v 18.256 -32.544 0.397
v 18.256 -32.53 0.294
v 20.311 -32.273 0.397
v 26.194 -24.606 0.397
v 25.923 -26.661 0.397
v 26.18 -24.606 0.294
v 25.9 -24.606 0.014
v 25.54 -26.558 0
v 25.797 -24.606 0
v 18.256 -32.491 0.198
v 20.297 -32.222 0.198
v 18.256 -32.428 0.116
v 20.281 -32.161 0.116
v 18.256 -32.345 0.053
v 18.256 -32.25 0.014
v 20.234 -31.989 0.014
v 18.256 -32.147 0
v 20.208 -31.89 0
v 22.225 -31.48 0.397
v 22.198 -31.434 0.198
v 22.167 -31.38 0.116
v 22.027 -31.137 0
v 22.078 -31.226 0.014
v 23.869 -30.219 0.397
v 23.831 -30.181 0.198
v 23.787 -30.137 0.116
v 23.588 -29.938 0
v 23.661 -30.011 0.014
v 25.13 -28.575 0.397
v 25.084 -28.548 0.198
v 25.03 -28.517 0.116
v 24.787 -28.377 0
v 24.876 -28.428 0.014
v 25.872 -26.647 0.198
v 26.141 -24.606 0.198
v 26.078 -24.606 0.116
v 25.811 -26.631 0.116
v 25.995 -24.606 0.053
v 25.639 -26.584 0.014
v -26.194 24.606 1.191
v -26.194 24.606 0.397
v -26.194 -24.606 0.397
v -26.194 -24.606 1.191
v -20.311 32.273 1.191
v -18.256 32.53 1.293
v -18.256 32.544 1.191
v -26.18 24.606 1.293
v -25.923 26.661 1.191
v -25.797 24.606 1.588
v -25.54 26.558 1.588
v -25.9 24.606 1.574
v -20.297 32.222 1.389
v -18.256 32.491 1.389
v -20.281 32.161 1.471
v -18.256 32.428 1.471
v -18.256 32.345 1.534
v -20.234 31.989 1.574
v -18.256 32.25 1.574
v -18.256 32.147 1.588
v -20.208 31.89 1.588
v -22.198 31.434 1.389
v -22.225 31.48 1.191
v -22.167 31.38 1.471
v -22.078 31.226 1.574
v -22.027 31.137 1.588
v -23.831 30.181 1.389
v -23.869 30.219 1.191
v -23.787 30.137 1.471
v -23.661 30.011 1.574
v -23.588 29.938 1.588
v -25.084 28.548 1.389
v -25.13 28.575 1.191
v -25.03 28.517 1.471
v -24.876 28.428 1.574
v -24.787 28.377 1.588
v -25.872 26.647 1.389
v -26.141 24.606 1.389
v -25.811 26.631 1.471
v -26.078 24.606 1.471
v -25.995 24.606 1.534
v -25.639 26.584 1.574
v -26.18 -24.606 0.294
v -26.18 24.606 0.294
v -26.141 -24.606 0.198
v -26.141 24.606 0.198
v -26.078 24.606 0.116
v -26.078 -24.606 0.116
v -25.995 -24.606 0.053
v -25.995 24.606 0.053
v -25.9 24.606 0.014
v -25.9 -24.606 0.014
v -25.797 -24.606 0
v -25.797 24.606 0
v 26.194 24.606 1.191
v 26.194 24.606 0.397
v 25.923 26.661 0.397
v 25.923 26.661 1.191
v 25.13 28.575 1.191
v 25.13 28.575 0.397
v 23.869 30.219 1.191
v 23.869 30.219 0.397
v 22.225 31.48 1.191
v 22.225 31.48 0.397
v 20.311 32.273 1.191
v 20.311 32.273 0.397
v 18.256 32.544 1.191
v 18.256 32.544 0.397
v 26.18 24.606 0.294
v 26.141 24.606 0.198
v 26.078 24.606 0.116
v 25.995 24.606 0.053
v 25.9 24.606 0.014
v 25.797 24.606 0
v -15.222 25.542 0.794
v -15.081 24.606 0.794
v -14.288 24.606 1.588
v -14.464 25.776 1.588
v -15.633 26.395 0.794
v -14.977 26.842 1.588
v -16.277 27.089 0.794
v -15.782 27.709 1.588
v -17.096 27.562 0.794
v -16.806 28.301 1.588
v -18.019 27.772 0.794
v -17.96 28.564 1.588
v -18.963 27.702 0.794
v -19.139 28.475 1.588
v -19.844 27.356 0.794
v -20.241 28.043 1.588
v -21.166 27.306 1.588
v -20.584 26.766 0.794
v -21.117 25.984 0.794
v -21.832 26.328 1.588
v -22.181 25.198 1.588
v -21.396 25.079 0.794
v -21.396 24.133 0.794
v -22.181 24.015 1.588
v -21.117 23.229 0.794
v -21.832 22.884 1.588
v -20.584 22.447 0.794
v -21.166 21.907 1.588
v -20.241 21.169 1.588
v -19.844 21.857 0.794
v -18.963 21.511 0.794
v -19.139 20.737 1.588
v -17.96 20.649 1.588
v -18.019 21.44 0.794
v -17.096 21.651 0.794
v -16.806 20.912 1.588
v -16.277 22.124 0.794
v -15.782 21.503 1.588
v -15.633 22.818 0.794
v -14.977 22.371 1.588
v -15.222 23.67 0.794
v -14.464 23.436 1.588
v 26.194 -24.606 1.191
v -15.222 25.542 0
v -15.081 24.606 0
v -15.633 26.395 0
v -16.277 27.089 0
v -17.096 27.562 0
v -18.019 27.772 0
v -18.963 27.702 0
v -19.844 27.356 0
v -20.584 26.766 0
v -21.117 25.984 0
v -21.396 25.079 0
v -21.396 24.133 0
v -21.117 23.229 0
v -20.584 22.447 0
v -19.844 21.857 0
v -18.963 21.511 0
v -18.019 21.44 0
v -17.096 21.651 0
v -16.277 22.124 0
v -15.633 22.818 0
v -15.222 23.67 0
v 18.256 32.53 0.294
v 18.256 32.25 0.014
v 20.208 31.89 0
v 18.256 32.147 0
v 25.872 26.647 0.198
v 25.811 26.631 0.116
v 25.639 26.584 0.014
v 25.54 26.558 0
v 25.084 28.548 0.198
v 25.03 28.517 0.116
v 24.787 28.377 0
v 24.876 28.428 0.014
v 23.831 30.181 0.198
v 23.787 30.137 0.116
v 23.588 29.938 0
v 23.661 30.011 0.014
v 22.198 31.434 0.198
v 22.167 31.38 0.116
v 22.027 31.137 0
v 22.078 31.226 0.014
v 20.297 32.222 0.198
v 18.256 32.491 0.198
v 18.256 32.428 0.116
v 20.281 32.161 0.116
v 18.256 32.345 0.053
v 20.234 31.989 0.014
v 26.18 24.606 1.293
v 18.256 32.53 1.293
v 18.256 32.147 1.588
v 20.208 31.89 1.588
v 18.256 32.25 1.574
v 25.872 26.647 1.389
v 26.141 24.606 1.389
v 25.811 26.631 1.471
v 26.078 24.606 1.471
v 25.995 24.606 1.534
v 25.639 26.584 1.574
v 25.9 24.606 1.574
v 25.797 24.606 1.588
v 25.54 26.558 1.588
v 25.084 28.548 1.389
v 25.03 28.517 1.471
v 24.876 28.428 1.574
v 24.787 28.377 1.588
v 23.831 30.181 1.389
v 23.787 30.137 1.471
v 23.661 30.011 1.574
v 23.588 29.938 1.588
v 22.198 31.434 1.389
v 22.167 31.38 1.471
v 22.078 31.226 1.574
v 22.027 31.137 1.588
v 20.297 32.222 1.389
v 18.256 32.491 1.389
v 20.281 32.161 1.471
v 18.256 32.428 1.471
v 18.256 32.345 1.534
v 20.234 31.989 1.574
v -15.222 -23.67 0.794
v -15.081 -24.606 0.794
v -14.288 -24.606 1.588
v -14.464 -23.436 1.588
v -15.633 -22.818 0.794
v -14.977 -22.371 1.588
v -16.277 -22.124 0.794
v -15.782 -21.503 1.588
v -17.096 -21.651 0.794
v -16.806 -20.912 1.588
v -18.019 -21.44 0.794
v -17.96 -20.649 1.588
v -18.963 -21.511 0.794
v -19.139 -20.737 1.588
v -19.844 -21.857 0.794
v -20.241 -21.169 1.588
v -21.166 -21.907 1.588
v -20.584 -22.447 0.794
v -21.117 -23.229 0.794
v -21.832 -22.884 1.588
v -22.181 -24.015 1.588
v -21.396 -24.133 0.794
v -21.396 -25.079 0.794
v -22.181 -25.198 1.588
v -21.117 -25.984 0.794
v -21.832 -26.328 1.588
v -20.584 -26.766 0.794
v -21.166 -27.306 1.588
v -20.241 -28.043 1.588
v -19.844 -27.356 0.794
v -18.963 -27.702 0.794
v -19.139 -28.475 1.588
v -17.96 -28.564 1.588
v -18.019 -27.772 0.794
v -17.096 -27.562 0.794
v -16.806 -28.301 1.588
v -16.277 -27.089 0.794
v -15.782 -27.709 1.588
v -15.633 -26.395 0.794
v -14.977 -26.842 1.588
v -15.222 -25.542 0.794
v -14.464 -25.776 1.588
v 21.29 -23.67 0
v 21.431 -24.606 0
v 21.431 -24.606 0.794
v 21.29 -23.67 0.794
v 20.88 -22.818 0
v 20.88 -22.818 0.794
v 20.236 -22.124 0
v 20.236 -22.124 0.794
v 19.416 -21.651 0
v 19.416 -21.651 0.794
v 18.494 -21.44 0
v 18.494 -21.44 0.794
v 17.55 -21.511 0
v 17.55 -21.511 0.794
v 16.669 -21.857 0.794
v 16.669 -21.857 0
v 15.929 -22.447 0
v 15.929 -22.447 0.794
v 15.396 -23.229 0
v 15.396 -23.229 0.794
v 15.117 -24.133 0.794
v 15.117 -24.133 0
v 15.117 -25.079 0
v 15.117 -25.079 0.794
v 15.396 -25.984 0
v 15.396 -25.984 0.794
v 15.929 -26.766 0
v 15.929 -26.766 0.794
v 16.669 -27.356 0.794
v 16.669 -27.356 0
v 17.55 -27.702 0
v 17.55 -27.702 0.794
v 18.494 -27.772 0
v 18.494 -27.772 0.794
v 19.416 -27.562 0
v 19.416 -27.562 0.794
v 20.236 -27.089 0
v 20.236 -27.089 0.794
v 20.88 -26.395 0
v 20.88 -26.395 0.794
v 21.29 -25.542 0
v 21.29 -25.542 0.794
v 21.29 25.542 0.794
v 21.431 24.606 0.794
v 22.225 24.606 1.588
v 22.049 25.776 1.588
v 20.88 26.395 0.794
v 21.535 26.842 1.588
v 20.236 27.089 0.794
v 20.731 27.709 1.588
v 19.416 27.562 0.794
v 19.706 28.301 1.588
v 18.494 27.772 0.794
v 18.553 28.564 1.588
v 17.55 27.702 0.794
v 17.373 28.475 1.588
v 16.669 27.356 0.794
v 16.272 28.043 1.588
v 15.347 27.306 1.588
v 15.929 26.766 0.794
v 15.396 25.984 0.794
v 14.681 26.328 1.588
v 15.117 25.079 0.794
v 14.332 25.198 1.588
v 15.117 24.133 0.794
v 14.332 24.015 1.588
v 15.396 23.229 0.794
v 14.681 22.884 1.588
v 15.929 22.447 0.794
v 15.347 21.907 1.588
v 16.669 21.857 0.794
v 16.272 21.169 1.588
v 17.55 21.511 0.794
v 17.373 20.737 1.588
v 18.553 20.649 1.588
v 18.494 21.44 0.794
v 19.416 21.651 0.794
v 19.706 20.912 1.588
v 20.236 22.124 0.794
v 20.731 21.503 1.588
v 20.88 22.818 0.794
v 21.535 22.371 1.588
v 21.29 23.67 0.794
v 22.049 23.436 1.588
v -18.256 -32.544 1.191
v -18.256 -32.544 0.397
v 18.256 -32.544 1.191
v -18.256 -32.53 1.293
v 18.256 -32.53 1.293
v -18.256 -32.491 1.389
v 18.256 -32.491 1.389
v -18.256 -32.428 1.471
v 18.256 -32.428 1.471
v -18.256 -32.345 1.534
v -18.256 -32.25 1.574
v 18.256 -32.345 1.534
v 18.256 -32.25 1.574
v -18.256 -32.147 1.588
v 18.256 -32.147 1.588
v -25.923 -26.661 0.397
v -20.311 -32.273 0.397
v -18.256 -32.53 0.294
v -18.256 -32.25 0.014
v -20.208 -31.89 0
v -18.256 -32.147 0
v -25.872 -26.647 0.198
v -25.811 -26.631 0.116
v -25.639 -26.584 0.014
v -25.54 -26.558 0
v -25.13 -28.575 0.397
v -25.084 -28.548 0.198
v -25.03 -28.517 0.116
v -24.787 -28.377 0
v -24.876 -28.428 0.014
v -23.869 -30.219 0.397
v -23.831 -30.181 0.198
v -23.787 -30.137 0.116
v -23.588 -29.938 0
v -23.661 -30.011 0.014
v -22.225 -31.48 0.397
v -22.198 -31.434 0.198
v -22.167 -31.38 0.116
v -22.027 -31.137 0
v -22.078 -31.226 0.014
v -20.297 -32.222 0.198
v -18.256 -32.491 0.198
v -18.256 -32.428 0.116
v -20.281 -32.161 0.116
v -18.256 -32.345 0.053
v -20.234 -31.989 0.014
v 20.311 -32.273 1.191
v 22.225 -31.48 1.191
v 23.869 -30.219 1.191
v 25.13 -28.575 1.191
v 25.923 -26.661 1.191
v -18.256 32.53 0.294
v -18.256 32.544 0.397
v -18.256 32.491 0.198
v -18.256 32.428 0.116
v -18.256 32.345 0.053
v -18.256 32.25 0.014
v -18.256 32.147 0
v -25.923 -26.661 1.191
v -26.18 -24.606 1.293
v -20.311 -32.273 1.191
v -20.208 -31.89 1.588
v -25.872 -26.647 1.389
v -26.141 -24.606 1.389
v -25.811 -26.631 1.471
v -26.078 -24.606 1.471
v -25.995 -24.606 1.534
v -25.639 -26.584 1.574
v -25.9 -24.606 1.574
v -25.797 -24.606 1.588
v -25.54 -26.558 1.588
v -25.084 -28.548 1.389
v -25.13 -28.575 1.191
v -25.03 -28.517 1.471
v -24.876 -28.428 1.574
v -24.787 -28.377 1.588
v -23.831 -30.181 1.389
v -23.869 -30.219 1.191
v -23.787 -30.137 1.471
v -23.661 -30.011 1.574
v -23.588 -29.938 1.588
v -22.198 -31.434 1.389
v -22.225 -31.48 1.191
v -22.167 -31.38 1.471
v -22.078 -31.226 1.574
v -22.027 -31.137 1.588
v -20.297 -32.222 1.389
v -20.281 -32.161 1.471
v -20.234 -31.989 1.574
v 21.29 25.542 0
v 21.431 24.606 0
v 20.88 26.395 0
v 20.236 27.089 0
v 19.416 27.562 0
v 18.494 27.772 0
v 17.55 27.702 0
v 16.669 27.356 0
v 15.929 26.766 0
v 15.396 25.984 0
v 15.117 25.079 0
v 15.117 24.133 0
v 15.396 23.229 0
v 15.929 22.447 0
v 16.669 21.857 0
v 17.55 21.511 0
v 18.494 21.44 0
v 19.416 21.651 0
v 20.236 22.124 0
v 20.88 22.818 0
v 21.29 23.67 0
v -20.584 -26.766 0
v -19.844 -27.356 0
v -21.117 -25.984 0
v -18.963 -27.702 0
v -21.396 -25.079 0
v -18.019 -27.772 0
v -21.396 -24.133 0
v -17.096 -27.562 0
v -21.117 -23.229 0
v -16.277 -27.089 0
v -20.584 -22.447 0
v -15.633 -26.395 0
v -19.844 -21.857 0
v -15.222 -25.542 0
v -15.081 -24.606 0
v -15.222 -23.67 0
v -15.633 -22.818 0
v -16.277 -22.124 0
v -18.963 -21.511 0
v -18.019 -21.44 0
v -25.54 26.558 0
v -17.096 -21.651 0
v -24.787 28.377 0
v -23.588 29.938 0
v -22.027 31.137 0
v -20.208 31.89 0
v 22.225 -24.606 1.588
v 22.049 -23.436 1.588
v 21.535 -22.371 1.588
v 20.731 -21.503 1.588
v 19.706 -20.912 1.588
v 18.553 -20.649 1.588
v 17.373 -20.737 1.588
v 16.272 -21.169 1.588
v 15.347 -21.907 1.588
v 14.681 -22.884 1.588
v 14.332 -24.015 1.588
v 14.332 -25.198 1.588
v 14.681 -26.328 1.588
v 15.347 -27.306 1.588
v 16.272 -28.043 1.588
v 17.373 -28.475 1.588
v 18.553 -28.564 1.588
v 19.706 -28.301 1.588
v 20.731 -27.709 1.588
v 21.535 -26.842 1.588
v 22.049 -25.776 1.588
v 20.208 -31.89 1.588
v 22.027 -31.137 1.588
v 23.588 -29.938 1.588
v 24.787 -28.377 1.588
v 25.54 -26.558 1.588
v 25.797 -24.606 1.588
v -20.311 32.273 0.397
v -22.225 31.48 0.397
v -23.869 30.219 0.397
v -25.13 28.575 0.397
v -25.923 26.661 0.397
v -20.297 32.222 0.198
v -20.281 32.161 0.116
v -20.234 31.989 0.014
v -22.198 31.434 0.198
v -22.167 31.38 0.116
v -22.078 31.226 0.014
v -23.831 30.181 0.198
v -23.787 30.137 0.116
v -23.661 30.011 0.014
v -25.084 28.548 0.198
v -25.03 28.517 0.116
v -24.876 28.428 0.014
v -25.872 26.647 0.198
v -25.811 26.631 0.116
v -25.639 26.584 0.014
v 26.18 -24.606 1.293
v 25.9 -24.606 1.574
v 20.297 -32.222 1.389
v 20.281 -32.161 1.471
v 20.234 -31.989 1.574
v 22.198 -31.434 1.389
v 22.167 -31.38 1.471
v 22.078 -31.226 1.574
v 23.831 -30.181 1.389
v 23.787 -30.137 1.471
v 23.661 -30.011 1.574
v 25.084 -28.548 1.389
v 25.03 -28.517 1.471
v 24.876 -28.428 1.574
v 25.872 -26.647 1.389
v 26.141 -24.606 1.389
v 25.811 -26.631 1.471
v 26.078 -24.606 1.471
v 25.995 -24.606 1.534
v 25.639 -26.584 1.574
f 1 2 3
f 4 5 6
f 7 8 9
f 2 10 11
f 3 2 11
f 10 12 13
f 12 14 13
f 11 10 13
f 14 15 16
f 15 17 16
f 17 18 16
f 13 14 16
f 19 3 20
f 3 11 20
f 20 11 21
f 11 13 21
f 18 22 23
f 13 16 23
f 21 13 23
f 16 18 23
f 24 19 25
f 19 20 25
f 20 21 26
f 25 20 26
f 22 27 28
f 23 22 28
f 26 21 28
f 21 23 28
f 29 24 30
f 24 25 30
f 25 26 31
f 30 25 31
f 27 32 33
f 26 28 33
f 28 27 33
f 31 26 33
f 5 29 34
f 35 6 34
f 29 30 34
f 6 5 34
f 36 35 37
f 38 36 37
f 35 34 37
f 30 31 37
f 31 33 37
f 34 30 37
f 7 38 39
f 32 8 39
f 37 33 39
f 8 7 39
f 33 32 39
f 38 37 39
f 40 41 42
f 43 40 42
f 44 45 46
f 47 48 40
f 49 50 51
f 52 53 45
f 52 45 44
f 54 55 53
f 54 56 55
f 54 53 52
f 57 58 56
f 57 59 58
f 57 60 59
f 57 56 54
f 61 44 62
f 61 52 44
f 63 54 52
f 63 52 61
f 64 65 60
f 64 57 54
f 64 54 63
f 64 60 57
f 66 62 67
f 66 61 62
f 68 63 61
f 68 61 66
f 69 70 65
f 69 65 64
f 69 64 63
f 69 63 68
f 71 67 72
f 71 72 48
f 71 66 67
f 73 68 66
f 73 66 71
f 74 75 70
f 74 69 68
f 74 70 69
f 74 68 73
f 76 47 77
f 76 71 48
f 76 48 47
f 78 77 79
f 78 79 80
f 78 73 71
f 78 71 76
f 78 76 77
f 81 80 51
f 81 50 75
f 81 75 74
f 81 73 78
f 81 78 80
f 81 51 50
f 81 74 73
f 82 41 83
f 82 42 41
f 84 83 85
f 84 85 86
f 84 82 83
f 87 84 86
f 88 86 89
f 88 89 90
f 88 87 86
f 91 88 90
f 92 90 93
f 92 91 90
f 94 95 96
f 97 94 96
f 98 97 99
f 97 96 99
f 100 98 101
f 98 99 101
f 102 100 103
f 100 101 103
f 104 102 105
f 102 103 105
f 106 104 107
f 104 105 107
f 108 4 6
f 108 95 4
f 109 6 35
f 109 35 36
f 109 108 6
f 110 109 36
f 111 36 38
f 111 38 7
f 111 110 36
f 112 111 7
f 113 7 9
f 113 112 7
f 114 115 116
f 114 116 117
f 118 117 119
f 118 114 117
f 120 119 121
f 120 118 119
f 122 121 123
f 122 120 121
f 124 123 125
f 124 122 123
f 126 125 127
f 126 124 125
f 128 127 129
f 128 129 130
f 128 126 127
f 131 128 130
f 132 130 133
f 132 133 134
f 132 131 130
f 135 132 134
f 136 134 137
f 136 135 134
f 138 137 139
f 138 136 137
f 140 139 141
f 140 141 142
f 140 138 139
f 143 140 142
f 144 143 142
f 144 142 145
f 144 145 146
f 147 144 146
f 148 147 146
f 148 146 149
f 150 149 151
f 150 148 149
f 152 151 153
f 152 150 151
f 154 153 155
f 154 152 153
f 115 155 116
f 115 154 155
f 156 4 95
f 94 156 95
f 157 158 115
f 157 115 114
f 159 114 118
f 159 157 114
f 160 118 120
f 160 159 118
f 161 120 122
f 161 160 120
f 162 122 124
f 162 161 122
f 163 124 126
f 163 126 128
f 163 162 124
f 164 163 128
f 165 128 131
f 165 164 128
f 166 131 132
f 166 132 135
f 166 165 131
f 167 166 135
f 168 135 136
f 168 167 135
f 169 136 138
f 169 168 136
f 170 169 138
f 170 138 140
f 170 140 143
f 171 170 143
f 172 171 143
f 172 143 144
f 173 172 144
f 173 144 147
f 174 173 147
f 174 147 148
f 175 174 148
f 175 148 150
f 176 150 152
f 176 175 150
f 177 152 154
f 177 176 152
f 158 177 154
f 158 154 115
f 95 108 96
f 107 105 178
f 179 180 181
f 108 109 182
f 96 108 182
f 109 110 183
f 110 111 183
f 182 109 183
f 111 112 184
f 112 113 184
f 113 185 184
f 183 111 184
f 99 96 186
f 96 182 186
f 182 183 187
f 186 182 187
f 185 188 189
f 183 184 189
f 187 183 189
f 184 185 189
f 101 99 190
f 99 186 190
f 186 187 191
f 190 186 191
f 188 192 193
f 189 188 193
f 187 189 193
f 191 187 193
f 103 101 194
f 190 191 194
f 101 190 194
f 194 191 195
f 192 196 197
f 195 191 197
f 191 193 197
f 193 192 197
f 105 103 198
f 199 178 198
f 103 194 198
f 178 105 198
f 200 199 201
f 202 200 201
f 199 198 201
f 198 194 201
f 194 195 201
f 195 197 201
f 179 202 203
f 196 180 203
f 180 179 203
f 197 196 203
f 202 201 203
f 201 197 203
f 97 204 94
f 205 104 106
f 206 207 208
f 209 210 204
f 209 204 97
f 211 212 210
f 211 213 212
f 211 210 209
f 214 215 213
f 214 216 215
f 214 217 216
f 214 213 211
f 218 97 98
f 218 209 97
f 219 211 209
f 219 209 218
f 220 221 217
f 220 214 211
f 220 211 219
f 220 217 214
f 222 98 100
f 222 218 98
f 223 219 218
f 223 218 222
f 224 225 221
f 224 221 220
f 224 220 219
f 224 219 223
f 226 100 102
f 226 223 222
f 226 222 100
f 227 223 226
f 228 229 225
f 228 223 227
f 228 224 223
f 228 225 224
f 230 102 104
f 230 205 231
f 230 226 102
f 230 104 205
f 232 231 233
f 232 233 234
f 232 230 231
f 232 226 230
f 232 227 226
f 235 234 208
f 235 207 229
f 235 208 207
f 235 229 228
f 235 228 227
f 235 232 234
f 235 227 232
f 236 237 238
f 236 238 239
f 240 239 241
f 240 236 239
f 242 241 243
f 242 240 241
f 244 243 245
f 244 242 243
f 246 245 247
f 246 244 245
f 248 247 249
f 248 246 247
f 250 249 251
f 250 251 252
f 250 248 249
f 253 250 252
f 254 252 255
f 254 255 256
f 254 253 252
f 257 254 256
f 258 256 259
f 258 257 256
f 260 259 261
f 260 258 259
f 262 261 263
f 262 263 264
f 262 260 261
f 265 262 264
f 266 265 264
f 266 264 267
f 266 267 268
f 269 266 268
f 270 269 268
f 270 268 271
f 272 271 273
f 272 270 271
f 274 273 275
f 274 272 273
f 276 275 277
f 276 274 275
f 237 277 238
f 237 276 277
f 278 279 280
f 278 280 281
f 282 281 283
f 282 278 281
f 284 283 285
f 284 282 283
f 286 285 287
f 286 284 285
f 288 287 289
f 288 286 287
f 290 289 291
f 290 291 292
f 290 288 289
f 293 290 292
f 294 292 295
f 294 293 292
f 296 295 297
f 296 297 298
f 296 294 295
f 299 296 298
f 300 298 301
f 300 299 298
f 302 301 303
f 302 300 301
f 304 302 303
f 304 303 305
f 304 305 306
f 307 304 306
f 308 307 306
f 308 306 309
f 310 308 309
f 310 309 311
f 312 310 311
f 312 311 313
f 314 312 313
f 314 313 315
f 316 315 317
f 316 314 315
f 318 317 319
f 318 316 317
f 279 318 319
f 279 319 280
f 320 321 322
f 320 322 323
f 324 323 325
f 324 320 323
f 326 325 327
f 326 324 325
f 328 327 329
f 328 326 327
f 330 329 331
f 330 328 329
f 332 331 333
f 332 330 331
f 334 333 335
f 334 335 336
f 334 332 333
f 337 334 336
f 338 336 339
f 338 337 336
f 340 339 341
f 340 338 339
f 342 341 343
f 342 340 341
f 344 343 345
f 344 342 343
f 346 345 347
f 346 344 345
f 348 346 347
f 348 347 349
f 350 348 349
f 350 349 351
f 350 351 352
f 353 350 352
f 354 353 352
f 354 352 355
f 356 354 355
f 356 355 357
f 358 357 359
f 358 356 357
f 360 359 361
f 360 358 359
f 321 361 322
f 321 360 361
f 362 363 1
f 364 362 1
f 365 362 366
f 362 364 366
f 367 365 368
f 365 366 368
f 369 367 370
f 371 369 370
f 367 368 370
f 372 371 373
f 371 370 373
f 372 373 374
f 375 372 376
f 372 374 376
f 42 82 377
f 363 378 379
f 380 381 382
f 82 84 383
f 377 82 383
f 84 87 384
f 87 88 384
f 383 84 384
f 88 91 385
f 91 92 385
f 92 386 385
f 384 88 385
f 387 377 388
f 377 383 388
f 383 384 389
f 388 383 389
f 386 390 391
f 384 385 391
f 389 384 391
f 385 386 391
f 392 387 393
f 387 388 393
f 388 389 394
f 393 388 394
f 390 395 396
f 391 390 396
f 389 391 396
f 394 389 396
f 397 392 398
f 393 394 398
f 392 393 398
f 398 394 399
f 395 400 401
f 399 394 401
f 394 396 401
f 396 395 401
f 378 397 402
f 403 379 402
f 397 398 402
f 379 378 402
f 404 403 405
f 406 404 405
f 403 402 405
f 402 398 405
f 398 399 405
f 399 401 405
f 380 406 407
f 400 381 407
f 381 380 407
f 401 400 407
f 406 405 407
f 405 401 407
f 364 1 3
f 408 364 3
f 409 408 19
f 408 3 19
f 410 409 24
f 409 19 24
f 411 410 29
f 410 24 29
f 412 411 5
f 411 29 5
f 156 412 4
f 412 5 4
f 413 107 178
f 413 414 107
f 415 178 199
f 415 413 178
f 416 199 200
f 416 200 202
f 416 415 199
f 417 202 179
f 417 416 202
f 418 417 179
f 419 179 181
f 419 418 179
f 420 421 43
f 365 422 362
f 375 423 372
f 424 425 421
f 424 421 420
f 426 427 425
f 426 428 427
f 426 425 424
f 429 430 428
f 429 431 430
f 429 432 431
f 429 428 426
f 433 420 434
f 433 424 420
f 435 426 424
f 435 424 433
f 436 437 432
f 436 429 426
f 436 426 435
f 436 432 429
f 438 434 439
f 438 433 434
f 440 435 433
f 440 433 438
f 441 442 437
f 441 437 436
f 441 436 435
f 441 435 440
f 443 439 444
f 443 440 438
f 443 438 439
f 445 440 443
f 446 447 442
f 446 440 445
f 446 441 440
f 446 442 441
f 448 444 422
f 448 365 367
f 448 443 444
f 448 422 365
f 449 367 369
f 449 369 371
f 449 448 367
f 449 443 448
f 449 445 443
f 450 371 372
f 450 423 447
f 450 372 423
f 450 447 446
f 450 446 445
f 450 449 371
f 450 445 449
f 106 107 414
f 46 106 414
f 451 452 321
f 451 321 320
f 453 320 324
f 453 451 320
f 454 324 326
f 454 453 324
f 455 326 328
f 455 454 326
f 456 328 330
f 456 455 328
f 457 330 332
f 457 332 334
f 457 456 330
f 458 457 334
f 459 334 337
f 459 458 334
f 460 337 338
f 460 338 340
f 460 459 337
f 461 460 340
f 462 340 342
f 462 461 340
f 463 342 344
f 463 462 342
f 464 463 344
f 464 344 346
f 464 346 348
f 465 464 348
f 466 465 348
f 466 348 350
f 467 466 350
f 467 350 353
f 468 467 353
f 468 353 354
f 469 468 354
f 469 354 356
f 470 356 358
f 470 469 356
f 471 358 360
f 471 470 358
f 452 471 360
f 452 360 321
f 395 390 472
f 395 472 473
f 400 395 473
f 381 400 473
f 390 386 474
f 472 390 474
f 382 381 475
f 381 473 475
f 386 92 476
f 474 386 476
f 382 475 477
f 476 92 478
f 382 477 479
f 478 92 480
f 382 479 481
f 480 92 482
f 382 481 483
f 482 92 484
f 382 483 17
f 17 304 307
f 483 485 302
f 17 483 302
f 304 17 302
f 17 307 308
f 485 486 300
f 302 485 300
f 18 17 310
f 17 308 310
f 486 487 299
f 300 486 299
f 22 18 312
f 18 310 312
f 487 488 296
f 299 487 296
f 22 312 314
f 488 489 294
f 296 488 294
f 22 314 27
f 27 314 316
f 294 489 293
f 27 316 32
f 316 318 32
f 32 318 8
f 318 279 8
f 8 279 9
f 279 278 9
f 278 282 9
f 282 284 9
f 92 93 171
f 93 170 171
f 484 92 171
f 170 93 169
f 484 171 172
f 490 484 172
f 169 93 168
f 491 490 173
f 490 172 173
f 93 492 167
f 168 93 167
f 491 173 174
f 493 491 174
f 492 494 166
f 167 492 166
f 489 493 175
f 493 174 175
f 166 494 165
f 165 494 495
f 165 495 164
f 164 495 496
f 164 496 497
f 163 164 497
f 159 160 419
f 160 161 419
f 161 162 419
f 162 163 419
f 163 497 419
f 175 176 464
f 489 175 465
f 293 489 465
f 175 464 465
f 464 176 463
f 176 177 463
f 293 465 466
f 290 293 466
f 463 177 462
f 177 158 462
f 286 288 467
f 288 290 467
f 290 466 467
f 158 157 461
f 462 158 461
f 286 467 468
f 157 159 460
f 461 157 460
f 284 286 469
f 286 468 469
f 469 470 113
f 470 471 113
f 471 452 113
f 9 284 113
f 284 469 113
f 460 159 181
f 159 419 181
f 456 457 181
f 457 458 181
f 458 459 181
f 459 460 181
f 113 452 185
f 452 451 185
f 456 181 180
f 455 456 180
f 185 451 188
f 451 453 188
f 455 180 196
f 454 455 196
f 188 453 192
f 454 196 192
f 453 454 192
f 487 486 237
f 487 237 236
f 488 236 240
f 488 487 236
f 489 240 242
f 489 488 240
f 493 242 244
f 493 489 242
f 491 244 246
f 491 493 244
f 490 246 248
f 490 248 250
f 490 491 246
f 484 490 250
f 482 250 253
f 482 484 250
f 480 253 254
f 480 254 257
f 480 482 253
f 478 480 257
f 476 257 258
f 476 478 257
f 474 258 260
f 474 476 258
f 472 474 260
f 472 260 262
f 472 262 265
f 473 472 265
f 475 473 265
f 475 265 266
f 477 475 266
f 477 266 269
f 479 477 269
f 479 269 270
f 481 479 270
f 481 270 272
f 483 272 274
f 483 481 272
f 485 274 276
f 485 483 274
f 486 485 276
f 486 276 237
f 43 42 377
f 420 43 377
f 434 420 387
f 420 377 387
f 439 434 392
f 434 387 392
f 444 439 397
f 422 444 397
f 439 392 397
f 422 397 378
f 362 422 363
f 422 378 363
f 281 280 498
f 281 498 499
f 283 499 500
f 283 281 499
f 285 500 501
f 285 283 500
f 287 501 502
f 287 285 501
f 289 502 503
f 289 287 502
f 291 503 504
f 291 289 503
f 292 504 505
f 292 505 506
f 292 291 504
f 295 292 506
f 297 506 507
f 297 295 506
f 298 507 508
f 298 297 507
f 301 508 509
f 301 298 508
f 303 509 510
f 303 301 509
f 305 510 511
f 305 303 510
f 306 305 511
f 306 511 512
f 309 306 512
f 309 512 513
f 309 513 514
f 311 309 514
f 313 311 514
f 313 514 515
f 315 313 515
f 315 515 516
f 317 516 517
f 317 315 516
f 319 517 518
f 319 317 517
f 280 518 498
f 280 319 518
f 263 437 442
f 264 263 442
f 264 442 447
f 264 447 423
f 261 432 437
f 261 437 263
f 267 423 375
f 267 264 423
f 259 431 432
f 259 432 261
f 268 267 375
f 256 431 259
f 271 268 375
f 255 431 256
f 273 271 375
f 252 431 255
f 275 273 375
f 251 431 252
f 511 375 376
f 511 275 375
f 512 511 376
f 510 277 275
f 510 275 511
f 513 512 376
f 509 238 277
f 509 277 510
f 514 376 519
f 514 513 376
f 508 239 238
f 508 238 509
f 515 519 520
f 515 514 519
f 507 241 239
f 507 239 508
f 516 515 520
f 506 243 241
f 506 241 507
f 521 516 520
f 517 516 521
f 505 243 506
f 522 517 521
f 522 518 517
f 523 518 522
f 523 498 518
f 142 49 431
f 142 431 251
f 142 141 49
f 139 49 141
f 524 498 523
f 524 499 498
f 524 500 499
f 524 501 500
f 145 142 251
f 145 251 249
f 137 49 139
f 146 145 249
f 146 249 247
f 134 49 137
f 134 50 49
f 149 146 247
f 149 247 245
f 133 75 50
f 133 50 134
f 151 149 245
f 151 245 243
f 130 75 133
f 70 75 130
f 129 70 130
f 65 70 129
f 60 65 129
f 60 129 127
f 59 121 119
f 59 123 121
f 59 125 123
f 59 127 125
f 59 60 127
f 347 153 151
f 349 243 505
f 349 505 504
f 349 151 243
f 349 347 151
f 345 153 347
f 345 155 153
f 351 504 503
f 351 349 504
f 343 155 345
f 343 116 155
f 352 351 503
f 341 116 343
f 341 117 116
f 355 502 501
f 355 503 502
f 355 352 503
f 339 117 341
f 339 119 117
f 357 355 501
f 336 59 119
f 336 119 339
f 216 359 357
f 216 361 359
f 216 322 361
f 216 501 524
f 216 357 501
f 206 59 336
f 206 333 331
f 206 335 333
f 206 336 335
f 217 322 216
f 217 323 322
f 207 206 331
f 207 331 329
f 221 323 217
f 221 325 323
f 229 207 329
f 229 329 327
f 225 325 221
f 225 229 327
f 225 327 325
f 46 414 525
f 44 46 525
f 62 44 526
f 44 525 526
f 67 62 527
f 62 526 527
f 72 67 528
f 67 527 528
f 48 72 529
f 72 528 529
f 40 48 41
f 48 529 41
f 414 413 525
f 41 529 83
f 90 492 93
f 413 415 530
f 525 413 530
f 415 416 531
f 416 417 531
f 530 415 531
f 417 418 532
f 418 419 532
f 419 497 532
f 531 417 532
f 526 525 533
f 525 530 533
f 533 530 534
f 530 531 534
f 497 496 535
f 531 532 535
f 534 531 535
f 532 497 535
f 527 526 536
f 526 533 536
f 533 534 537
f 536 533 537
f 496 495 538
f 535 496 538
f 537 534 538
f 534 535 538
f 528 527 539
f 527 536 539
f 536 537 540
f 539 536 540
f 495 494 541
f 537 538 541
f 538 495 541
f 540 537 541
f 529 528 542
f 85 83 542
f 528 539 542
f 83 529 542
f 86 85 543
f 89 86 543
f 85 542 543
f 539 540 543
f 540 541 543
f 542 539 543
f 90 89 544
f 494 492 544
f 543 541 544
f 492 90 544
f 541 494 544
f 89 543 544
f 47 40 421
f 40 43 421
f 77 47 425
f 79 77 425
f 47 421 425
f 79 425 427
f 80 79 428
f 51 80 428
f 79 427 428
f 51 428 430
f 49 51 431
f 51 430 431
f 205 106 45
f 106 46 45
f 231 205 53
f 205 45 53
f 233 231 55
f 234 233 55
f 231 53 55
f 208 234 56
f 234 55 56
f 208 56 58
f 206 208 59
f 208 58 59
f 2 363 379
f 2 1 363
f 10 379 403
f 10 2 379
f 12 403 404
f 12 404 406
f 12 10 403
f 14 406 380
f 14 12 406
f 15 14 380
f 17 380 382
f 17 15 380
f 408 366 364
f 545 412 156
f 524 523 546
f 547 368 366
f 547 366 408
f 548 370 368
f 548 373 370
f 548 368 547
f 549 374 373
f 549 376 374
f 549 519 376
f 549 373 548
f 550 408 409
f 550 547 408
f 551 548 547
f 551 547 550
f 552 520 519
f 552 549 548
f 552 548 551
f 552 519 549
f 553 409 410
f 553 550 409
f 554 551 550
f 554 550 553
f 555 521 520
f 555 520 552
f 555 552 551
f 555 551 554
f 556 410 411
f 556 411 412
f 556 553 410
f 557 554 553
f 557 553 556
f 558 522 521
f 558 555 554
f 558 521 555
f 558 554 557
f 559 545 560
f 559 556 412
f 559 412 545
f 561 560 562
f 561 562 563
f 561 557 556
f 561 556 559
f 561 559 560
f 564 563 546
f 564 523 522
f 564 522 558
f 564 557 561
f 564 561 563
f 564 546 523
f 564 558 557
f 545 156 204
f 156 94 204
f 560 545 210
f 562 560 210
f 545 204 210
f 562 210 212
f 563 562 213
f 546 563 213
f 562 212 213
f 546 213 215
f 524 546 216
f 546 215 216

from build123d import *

# Parameters (mm, degrees)
F0_R     = 3.175
F1_DEPTH = 1.5875
F2_R     = 0.396875
F3_SIZE  = 0.79375


with BuildPart() as f1:
    # F0 (on Top) → F1 (new body)
    with BuildSketch(Plane.XY):
        with BuildLine():
            Line((18.25625, 32.54375), (-18.25625, 32.54375))
            ThreePointArc((-18.25625, 32.54375), (-23.86891, 30.21891), (-26.19375, 24.60625))
            Line((-26.19375, 24.60625), (-26.19375, -24.60625))
            ThreePointArc((-26.19375, -24.60625), (-23.86891, -30.21891), (-18.25625, -32.54375))
            Line((-18.25625, -32.54375), (18.25625, -32.54375))
            ThreePointArc((18.25625, -32.54375), (23.86891, -30.21891), (26.19375, -24.60625))
            Line((26.19375, -24.60625), (26.19375, 24.60625))
            ThreePointArc((26.19375, 24.60625), (23.86891, 30.21891), (18.25625, 32.54375))
        make_face()
        with Locations((-18.25625, -24.60625)):
            Circle(F0_R, mode=Mode.SUBTRACT)
        with Locations((18.25625, -24.60625)):
            Circle(F0_R, mode=Mode.SUBTRACT)
        with Locations((-18.25625, 24.60625)):
            Circle(F0_R, mode=Mode.SUBTRACT)
        with Locations((18.25625, 24.60625)):
            Circle(F0_R, mode=Mode.SUBTRACT)
    extrude(amount=F1_DEPTH)

    # F2
    f2_edges = [f1.edges().sort_by_distance(p)[0] for p in [
        (-18.25625, -32.54375, 0.79375),
        (18.25625, -32.54375, 0.79375),
        (0, -32.54375, 0),
        (0, -32.54375, 1.5875),
        (26.19375, -24.60625, 0.79375),
        (23.86891, -30.21891, 0),
        (23.86891, -30.21891, 1.5875),
        (26.19375, 24.60625, 0.79375),
        (26.19375, 0, 0),
        (26.19375, 0, 1.5875),
        (-26.19375, -24.60625, 0.79375),
        (-23.86891, -30.21891, 0),
        (-23.86891, -30.21891, 1.5875),
        (-26.19375, 24.60625, 0.79375),
        (-26.19375, 0, 0),
        (-26.19375, 0, 1.5875),
        (-18.25625, 32.54375, 0.79375),
        (-23.86891, 30.21891, 0),
        (-23.86891, 30.21891, 1.5875),
        (18.25625, 32.54375, 0.79375),
        (0, 32.54375, 0),
        (0, 32.54375, 1.5875),
        (23.86891, 30.21891, 0),
        (23.86891, 30.21891, 1.5875),
    ]]
    fillet(f2_edges, radius=F2_R)

    # F3
    f3_edges = [f1.edges().sort_by_distance(p)[0] for p in [
        (15.08125, -24.60625, 1.5875),
        (-21.43125, -24.60625, 1.5875),
        (-21.43125, 24.60625, 1.5875),
        (15.08125, 24.60625, 1.5875),
    ]]
    chamfer(f3_edges, length=F3_SIZE)


solid = f1.part
